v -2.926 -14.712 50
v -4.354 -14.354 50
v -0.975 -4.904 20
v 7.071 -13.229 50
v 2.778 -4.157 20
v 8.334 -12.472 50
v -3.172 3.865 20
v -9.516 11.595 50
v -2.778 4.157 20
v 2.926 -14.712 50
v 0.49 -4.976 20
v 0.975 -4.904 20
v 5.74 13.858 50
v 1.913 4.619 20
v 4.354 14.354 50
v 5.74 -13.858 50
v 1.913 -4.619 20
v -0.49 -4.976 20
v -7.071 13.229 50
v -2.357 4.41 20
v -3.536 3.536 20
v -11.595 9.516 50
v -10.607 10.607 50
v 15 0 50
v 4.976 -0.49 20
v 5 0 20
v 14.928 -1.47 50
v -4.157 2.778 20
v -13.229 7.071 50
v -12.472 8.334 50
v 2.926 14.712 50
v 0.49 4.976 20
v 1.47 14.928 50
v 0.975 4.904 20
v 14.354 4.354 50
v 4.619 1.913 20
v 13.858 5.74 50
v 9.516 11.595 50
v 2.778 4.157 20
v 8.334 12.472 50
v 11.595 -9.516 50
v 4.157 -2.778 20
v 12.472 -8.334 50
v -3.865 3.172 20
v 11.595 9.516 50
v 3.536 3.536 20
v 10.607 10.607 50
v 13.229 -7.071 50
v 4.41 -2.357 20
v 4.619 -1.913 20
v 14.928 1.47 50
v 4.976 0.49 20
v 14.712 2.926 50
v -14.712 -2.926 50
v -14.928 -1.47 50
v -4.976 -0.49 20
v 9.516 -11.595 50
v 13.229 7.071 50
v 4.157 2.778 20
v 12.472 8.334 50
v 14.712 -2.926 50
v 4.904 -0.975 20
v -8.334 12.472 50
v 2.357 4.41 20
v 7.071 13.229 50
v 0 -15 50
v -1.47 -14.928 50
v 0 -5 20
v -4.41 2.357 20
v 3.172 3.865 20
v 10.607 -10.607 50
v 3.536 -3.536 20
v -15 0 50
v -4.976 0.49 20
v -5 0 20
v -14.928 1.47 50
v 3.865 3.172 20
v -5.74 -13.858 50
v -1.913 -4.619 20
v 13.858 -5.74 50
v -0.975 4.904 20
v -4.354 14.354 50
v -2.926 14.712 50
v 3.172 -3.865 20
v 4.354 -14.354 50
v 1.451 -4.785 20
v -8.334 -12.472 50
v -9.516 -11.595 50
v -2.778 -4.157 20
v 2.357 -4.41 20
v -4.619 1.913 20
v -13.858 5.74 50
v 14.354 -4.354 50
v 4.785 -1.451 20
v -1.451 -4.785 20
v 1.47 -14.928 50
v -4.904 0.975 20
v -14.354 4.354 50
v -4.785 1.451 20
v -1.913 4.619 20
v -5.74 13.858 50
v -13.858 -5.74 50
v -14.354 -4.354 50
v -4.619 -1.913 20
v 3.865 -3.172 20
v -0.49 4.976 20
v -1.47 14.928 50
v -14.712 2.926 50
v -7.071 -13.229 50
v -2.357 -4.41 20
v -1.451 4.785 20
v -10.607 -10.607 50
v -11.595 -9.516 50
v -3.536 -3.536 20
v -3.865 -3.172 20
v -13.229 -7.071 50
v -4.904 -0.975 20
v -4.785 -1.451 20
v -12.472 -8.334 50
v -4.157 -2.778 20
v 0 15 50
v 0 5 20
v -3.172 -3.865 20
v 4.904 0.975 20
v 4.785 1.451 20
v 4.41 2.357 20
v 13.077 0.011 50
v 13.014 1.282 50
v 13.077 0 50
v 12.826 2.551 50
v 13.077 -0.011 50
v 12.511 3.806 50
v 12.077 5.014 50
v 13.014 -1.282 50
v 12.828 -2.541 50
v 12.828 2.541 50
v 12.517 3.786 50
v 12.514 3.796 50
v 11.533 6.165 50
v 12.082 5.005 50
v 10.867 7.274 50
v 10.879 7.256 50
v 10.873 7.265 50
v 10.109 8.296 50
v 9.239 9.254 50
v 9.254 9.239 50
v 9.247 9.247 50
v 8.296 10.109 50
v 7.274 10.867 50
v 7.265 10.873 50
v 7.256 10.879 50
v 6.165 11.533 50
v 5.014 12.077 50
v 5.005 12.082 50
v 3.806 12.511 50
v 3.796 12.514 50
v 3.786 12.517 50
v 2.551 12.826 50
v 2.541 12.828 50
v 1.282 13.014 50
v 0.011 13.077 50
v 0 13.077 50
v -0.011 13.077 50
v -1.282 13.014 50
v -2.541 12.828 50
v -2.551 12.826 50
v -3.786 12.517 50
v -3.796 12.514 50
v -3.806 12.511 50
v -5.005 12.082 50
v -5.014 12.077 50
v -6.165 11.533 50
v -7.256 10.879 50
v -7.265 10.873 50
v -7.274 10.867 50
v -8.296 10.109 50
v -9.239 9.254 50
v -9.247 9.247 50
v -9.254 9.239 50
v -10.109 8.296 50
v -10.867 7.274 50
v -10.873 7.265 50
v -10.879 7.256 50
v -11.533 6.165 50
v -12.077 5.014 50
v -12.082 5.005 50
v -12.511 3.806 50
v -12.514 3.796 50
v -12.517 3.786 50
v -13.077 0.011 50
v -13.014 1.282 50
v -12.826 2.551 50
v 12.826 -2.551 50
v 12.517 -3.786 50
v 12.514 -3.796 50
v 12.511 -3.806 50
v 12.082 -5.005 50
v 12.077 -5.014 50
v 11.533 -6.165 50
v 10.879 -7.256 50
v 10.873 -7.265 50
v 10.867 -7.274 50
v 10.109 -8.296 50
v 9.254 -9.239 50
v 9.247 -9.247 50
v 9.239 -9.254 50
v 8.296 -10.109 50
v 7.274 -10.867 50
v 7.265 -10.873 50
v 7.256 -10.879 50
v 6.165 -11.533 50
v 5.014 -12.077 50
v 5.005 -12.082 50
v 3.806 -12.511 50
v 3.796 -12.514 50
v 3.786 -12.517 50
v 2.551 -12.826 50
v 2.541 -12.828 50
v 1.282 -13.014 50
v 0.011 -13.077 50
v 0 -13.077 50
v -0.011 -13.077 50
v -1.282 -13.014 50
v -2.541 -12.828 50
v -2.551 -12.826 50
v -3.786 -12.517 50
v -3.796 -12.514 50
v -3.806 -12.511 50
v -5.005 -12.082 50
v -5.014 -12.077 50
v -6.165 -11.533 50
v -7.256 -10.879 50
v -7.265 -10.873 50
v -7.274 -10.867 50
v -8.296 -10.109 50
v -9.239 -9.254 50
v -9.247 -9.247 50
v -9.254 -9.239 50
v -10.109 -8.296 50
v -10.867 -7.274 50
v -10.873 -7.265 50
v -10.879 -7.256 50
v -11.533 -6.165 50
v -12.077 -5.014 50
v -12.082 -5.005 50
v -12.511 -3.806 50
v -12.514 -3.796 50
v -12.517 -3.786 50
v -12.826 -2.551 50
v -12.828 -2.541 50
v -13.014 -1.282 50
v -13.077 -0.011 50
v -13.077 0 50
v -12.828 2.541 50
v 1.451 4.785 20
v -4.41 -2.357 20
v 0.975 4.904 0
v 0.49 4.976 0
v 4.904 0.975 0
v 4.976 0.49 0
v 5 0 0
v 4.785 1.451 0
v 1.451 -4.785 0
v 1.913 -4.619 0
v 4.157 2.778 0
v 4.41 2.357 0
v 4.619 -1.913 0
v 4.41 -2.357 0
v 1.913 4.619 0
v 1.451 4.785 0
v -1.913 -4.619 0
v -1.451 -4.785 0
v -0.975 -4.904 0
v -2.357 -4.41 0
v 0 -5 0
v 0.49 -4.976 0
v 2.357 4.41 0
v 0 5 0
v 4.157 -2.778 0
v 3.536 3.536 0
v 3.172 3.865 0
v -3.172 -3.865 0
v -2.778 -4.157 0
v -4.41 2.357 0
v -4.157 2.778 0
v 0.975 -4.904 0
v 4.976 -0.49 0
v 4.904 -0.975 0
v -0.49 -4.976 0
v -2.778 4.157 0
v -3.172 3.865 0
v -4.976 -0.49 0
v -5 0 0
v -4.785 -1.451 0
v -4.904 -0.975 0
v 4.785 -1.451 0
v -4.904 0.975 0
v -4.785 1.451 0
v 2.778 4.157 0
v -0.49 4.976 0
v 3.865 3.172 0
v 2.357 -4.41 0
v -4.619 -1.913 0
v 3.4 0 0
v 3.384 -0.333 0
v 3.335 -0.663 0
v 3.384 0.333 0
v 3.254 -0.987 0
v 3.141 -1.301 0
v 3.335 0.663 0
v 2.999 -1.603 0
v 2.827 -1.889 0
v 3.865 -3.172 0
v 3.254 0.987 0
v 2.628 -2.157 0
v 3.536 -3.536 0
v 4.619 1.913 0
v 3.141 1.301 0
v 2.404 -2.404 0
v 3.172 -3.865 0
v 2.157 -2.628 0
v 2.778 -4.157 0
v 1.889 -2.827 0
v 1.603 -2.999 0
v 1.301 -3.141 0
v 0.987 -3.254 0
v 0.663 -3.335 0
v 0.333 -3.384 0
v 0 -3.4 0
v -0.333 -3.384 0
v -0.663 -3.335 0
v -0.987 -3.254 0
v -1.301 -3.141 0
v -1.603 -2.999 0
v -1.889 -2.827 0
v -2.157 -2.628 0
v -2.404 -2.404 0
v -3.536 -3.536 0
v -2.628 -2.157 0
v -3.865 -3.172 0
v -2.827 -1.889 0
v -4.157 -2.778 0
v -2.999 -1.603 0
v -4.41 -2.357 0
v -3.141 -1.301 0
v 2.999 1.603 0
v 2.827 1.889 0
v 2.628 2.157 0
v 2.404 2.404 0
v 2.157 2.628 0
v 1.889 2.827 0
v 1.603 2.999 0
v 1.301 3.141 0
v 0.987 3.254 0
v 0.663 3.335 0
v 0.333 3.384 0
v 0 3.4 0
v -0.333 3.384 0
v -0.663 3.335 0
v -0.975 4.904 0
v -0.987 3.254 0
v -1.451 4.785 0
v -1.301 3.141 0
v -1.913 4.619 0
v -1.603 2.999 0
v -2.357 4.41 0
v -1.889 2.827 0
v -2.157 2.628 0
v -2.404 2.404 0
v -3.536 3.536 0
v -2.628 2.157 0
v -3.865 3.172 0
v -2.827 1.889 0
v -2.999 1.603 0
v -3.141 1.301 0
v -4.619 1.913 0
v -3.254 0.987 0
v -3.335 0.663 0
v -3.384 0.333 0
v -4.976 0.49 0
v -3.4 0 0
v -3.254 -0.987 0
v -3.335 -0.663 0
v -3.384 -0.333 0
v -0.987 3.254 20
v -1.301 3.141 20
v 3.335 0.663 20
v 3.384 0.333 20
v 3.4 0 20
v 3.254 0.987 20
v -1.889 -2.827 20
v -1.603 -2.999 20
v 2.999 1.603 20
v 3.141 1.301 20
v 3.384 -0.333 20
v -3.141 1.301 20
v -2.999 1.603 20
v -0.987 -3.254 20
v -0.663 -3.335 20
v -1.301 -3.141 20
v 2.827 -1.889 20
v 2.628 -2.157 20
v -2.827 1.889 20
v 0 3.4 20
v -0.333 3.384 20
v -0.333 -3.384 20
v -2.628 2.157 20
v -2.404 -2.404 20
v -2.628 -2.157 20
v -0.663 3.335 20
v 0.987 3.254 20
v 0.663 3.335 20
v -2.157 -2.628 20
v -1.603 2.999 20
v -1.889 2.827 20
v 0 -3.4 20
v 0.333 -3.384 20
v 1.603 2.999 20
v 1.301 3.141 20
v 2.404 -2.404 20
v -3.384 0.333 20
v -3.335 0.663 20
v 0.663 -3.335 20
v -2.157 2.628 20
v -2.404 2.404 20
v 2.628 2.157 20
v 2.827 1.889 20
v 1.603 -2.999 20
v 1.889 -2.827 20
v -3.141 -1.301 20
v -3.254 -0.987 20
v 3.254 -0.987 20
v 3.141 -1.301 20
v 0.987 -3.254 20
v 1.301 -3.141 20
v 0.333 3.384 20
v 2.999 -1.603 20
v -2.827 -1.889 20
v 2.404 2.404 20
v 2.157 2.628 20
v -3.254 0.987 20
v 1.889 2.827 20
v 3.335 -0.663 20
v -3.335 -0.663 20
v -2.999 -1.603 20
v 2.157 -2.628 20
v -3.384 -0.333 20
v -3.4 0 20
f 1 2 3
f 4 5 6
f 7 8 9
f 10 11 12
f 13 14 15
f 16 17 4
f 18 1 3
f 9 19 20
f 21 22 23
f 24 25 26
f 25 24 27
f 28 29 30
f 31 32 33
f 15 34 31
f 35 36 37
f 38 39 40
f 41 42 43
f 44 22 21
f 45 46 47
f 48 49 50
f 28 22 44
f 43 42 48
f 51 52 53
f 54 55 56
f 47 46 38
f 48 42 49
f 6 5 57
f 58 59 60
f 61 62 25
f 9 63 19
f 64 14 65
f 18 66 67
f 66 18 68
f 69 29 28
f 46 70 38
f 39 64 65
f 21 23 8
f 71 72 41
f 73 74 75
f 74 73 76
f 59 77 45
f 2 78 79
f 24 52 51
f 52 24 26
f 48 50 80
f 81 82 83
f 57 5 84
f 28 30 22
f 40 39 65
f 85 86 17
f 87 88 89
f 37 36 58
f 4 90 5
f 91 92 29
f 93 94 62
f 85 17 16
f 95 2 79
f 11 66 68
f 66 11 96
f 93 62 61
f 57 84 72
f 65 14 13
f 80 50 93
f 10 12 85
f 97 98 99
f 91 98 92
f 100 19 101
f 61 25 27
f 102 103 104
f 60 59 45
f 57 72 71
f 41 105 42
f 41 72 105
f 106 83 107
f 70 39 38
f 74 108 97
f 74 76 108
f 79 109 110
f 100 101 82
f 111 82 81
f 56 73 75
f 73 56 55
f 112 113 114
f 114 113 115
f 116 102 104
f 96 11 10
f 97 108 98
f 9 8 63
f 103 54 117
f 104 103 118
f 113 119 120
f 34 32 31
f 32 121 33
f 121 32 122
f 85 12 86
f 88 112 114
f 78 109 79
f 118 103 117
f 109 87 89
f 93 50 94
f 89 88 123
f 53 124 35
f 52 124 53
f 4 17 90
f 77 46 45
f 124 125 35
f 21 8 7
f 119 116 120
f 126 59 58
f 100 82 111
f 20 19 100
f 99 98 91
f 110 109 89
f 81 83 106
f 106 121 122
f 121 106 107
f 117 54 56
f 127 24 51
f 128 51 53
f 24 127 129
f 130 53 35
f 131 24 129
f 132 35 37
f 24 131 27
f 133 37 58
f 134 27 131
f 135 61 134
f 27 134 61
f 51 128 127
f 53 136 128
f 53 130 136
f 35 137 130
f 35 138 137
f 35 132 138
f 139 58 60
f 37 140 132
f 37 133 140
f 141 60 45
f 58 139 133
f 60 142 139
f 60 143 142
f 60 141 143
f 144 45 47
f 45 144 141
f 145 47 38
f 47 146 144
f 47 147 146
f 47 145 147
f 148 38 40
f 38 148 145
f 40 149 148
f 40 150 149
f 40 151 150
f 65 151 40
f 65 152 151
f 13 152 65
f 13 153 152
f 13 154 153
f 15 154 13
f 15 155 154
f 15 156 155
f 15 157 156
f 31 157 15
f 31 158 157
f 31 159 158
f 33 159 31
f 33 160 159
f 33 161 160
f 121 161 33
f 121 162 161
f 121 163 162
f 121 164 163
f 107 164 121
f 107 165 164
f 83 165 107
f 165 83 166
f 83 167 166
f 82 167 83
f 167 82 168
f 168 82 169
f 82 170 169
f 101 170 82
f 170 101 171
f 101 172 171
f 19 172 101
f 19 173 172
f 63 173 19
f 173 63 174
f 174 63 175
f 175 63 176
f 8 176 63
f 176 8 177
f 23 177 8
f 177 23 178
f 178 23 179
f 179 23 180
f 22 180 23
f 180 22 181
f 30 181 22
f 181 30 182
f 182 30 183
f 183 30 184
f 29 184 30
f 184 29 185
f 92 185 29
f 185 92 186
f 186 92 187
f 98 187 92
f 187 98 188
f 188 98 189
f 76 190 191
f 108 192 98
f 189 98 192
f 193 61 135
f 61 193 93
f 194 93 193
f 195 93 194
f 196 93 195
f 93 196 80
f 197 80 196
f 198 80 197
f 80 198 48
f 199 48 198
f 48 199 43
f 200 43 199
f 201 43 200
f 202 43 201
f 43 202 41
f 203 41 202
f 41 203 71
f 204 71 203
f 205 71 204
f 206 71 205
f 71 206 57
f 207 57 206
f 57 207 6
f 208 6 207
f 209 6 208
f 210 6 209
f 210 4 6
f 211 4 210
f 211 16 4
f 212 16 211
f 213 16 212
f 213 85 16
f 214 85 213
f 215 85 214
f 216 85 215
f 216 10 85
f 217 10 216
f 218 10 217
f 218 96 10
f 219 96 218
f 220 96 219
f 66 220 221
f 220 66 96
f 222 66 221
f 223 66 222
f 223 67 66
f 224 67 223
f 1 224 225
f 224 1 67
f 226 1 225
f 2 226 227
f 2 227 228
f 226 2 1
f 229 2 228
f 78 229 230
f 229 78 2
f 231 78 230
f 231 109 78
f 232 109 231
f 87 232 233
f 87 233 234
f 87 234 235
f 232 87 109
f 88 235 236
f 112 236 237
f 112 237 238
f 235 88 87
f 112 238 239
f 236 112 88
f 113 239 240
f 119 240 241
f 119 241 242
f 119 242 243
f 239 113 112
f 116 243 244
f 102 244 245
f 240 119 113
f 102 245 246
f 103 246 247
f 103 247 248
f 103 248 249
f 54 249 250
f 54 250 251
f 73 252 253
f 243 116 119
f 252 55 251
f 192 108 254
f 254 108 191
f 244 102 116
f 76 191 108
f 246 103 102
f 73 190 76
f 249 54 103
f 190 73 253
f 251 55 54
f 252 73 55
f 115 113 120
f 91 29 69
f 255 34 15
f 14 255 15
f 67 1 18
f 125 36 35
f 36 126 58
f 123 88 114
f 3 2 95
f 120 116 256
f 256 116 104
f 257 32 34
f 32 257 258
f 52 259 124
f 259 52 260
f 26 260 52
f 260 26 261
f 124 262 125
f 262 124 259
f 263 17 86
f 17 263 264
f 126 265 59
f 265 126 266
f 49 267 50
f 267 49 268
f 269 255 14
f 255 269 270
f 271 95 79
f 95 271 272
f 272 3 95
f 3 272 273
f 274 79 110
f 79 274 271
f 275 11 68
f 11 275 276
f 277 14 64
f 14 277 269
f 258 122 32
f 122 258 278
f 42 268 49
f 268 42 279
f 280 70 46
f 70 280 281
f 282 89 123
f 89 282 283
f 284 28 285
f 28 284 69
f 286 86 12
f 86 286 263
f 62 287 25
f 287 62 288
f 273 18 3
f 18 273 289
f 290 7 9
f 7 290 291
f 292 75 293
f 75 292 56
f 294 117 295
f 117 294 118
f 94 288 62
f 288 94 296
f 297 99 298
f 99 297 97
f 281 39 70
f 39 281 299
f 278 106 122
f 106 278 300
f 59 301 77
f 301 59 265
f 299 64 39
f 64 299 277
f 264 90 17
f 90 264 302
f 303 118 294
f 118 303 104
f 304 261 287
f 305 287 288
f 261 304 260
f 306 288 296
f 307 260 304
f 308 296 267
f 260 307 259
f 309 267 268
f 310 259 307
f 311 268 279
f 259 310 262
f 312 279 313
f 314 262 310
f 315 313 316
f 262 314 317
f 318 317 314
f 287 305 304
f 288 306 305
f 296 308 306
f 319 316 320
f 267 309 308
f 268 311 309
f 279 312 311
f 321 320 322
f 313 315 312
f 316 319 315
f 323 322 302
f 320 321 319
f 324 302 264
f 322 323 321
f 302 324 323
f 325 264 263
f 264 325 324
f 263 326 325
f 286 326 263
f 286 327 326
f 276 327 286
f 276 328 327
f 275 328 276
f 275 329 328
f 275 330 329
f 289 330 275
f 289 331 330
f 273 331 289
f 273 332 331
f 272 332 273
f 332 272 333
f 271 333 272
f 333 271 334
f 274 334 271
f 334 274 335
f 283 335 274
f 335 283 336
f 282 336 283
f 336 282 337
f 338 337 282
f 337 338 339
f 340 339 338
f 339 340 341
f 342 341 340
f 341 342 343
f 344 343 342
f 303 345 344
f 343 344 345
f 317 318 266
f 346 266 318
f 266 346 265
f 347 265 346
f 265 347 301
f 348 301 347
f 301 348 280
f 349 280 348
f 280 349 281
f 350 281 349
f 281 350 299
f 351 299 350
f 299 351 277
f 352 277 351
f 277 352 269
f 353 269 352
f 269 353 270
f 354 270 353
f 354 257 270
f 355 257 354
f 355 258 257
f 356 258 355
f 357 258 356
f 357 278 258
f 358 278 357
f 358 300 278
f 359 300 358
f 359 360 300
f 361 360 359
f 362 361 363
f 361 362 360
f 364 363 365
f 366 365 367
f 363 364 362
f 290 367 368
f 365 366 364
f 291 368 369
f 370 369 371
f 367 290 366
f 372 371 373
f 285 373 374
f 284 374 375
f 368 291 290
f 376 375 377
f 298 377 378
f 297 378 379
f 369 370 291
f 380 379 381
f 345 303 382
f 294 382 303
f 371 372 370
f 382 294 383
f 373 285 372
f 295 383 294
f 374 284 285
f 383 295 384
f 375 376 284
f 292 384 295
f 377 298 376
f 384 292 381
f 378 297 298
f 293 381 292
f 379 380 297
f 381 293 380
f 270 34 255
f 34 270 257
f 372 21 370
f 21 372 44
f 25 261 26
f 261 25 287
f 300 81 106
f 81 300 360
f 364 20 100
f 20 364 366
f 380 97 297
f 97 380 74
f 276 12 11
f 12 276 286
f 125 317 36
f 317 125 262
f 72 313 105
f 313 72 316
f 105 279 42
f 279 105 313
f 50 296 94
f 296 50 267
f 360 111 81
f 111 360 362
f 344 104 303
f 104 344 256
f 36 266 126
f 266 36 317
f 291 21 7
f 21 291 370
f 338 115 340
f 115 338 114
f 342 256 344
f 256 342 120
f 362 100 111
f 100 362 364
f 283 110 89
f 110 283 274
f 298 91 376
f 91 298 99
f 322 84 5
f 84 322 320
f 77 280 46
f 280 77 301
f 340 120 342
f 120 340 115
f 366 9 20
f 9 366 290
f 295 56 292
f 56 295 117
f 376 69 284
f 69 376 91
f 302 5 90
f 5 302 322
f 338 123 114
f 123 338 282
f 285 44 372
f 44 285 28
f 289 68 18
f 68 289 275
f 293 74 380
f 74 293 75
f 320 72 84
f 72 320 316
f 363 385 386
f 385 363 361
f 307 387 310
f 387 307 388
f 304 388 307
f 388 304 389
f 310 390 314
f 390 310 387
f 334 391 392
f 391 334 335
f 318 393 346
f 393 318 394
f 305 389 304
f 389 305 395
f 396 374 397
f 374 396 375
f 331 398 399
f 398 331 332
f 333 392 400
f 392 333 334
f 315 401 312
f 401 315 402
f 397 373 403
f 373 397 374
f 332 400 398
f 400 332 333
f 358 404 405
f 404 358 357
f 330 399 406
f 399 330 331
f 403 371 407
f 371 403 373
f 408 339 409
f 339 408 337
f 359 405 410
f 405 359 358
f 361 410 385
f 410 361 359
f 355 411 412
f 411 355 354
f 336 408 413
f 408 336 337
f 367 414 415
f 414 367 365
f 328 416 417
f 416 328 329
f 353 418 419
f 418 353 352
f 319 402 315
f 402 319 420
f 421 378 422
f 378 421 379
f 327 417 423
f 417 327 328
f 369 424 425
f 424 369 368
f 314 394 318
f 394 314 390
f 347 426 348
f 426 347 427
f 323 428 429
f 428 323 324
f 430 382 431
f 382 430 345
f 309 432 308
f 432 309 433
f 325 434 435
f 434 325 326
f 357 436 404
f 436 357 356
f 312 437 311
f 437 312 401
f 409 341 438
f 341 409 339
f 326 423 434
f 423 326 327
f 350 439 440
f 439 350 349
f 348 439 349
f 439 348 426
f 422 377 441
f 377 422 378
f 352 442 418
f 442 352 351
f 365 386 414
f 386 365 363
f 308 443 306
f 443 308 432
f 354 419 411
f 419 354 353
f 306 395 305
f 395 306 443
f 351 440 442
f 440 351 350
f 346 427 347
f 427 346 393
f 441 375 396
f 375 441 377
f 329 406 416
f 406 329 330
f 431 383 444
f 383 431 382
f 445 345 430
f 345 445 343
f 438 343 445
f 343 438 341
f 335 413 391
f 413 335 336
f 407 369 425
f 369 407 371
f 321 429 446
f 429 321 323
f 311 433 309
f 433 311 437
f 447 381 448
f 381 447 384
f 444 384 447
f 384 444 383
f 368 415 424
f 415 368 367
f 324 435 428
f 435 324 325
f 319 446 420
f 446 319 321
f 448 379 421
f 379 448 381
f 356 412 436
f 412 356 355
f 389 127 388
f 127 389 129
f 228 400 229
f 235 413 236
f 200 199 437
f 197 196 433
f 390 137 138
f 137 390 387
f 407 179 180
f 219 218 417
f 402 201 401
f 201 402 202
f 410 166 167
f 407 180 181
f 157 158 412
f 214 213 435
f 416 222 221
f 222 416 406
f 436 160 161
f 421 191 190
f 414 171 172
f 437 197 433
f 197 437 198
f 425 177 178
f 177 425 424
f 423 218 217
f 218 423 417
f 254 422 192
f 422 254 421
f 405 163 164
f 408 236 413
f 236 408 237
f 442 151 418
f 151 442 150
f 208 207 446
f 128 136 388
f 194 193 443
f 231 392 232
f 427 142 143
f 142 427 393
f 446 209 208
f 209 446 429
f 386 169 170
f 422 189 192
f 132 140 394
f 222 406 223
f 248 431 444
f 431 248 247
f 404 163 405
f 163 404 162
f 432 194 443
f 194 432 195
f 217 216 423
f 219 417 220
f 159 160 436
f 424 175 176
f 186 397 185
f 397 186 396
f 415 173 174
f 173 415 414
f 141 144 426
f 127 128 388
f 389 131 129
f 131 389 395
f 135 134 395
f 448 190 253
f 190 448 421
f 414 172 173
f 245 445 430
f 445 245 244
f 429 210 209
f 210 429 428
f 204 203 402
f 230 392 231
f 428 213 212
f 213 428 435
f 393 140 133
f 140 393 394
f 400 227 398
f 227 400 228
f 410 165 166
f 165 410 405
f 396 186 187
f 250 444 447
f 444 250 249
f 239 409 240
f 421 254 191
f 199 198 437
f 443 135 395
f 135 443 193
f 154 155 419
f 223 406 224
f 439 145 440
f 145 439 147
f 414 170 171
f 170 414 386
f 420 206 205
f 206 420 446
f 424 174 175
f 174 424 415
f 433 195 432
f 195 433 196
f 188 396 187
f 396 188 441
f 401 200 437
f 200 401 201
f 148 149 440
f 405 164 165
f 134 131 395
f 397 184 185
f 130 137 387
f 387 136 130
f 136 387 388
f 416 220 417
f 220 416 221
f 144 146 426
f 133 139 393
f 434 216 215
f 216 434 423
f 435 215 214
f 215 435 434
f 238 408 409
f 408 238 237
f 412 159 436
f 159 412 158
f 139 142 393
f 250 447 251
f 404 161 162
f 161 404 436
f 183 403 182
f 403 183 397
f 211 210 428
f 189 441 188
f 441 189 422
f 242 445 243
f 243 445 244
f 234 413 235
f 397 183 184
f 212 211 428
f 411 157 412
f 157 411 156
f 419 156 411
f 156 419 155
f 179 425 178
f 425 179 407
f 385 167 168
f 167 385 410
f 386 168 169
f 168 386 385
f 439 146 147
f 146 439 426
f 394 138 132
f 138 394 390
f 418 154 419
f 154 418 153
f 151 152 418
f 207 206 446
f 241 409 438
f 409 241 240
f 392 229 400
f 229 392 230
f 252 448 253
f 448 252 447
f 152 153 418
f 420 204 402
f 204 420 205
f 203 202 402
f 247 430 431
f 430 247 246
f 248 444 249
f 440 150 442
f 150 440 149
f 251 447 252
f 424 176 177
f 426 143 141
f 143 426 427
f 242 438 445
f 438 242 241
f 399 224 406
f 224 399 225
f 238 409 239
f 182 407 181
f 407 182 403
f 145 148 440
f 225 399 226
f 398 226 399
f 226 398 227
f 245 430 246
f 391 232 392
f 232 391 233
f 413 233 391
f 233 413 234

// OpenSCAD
// Funnel - a conical mouth narrowing into a straight spout, hollow with a constant wall. NOVEL
// general part (a generic funnel, not any one labware item).
//
// @desc hollow funnel: conical mouth into a straight spout
// @prompt Design a funnel in OpenSCAD: a cone {top} mm across the mouth narrowing over {cone_h} mm to a spout {spout_d} mm across and {spout_l} mm long, with a {wall} mm wall throughout. Reply with a single complete OpenSCAD file.
// @param top     mouth diameter, mm   [30:90]
// @param spout_d spout diameter, mm   [6:20]
// @param cone_h  cone height, mm      [20:60]
// @param spout_l spout length, mm     [10:40]
// @param wall    wall thickness, mm   [1.2:3]

top     = 30;
spout_d = 10;
cone_h  = 30;
spout_l = 20;
wall    = 1.6;

$fn = 64;

ib = max(1.6, spout_d - 2 * wall);   // keep the spout bore open even if the wall is thick

translate([0, 0, spout_l])          // rest the spout tip on the bed (z = 0)
difference() {
    union() {
        cylinder(h = cone_h, d1 = spout_d, d2 = top);                 // cone: spout end up to mouth
        translate([0, 0, -spout_l]) cylinder(h = spout_l + 0.01, d = spout_d);   // spout below
    }
    translate([0, 0, -spout_l - 1])
        cylinder(h = spout_l + 1 + 0.01, d = ib);                     // bore through the spout
    cylinder(h = cone_h + 1, d1 = ib, d2 = top - 2 * wall);           // inner cone, open mouth
}
